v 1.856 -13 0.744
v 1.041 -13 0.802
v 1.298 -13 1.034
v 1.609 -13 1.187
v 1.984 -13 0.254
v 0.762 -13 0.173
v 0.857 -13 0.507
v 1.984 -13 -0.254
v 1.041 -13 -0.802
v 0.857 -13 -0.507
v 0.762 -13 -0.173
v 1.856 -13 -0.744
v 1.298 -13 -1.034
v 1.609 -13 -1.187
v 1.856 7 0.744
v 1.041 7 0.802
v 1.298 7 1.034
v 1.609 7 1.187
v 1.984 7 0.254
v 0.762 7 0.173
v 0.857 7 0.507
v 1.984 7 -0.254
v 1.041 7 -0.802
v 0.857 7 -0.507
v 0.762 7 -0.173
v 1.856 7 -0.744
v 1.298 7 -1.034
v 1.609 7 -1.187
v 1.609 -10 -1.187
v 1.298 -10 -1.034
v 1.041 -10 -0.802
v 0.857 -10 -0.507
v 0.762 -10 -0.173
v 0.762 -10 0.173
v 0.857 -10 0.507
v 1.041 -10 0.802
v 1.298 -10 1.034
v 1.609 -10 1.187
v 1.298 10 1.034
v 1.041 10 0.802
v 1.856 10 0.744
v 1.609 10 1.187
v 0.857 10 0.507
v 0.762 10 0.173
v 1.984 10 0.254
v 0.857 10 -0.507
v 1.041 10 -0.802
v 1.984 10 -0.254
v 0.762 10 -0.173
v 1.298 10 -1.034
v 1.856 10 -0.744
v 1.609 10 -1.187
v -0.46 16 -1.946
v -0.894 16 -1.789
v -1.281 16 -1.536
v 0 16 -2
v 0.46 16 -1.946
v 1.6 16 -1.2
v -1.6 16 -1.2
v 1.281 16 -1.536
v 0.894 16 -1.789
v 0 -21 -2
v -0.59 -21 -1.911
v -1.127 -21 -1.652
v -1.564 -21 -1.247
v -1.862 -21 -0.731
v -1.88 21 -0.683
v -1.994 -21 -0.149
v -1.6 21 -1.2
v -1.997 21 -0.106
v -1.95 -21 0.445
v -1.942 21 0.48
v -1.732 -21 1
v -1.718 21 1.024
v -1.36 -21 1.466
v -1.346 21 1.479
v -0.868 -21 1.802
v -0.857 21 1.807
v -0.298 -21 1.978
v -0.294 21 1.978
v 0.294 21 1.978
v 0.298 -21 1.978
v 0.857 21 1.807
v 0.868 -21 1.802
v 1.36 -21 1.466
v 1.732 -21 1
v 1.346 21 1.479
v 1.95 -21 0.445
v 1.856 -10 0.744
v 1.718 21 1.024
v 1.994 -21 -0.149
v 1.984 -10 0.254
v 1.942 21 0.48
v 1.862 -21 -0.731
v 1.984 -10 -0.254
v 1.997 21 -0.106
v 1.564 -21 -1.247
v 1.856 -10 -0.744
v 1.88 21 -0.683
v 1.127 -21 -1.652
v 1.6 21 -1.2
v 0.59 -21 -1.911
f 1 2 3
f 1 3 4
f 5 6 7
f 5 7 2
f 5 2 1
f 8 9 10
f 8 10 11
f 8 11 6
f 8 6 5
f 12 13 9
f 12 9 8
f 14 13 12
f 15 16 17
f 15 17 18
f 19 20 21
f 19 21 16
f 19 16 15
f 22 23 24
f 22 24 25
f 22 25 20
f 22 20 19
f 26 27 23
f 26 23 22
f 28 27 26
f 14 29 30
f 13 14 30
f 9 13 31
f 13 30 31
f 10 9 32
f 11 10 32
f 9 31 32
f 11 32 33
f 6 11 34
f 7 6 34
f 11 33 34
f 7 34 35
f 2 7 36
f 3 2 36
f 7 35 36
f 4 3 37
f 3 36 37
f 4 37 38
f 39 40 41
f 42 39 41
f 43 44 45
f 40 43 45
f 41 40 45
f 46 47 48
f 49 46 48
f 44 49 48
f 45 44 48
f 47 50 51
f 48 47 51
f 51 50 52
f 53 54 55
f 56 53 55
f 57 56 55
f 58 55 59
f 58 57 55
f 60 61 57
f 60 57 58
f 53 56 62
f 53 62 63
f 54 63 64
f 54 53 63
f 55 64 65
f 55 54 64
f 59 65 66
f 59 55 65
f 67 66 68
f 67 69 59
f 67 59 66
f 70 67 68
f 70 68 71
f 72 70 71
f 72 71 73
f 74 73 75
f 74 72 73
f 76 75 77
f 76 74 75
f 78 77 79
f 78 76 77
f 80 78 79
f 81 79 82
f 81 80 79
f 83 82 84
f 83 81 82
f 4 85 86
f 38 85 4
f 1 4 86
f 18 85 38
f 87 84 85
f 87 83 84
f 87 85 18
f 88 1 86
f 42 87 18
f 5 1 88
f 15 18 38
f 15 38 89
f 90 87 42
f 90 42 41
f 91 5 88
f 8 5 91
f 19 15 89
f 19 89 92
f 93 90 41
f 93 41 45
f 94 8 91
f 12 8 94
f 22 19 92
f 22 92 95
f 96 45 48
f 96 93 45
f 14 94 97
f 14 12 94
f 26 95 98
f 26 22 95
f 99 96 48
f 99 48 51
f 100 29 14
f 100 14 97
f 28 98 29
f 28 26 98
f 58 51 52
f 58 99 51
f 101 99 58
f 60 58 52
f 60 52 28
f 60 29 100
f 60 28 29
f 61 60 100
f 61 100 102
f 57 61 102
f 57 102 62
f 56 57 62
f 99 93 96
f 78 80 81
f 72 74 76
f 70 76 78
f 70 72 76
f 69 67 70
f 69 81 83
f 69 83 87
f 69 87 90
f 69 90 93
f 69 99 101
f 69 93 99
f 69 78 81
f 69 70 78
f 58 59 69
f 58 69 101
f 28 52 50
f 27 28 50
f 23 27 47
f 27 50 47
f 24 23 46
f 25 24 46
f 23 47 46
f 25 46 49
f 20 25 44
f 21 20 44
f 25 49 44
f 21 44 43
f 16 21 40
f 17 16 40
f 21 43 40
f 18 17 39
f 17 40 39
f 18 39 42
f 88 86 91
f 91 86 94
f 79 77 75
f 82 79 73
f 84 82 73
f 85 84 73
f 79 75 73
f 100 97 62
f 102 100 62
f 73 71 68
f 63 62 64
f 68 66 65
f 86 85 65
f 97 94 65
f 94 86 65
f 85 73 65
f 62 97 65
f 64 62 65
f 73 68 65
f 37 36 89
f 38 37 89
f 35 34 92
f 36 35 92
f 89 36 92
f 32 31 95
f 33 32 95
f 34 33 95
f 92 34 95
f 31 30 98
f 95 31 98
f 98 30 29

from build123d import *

# Parameters (mm, degrees)
CROQUIS1_R                 = 2
SALIENTE_EXTRUIR1_DEPTH    = 21
CORTAR_EXTRUIR1_DEPTH      = 43.09513036
CORTAR_EXTRUIR1_DEPTH_BACK = 5
CUT_EXTRUDE1_START         = 10
SKETCH2_R                  = 1.25
CUT_EXTRUDE1_DEPTH         = 3
LPATTERN1_COUNT            = 2
LPATTERN1_PITCH            = 20


with BuildPart() as part:
    # Croquis1 → Saliente-Extruir1 (new, symmetric)
    with BuildSketch(Plane(origin=(0, 0, 0), x_dir=(1, 0, 0), z_dir=(0, 1, 0))):
        with Locations(Location((0, 0, 0), (0, 0, 90))):
            Circle(CROQUIS1_R)
    extrude(amount=SALIENTE_EXTRUIR1_DEPTH, both=True)

    # Croquis2 → Cortar-Extruir1 (cut, two sides: drawn at the far end of the back side and taken through both)
    with BuildSketch(Plane(origin=(0, 21, 0), x_dir=(1, 0, 0), z_dir=(0, 1, 0)).offset(-CORTAR_EXTRUIR1_DEPTH_BACK)):
        Polygon((-21.233275663, 1.2), (-1.6, 1.2), (1.6, 1.2), (21.233275663, 1.2), (21.233275663, 40.466551326), (-21.233275663, 40.466551326), align=None)
    extrude(amount=CORTAR_EXTRUIR1_DEPTH + CORTAR_EXTRUIR1_DEPTH_BACK, mode=Mode.SUBTRACT)

    # Sketch2 → Cut-Extrude1 (cut)
    with BuildSketch(Plane(origin=(0, 0, 0), x_dir=(1, 0, 0), z_dir=(0, 1, 0)).offset(CUT_EXTRUDE1_START)):
        with Locations((2, 0)):
            Circle(SKETCH2_R)
    cut_extrude1 = extrude(amount=-CUT_EXTRUDE1_DEPTH, mode=Mode.SUBTRACT)

    # LPattern1: Cut-Extrude1 ×2
    with Locations(*[(0, -i * LPATTERN1_PITCH, 0) for i in range(1, LPATTERN1_COUNT)]):
        add(cut_extrude1, mode=Mode.SUBTRACT)


solid = part.part
